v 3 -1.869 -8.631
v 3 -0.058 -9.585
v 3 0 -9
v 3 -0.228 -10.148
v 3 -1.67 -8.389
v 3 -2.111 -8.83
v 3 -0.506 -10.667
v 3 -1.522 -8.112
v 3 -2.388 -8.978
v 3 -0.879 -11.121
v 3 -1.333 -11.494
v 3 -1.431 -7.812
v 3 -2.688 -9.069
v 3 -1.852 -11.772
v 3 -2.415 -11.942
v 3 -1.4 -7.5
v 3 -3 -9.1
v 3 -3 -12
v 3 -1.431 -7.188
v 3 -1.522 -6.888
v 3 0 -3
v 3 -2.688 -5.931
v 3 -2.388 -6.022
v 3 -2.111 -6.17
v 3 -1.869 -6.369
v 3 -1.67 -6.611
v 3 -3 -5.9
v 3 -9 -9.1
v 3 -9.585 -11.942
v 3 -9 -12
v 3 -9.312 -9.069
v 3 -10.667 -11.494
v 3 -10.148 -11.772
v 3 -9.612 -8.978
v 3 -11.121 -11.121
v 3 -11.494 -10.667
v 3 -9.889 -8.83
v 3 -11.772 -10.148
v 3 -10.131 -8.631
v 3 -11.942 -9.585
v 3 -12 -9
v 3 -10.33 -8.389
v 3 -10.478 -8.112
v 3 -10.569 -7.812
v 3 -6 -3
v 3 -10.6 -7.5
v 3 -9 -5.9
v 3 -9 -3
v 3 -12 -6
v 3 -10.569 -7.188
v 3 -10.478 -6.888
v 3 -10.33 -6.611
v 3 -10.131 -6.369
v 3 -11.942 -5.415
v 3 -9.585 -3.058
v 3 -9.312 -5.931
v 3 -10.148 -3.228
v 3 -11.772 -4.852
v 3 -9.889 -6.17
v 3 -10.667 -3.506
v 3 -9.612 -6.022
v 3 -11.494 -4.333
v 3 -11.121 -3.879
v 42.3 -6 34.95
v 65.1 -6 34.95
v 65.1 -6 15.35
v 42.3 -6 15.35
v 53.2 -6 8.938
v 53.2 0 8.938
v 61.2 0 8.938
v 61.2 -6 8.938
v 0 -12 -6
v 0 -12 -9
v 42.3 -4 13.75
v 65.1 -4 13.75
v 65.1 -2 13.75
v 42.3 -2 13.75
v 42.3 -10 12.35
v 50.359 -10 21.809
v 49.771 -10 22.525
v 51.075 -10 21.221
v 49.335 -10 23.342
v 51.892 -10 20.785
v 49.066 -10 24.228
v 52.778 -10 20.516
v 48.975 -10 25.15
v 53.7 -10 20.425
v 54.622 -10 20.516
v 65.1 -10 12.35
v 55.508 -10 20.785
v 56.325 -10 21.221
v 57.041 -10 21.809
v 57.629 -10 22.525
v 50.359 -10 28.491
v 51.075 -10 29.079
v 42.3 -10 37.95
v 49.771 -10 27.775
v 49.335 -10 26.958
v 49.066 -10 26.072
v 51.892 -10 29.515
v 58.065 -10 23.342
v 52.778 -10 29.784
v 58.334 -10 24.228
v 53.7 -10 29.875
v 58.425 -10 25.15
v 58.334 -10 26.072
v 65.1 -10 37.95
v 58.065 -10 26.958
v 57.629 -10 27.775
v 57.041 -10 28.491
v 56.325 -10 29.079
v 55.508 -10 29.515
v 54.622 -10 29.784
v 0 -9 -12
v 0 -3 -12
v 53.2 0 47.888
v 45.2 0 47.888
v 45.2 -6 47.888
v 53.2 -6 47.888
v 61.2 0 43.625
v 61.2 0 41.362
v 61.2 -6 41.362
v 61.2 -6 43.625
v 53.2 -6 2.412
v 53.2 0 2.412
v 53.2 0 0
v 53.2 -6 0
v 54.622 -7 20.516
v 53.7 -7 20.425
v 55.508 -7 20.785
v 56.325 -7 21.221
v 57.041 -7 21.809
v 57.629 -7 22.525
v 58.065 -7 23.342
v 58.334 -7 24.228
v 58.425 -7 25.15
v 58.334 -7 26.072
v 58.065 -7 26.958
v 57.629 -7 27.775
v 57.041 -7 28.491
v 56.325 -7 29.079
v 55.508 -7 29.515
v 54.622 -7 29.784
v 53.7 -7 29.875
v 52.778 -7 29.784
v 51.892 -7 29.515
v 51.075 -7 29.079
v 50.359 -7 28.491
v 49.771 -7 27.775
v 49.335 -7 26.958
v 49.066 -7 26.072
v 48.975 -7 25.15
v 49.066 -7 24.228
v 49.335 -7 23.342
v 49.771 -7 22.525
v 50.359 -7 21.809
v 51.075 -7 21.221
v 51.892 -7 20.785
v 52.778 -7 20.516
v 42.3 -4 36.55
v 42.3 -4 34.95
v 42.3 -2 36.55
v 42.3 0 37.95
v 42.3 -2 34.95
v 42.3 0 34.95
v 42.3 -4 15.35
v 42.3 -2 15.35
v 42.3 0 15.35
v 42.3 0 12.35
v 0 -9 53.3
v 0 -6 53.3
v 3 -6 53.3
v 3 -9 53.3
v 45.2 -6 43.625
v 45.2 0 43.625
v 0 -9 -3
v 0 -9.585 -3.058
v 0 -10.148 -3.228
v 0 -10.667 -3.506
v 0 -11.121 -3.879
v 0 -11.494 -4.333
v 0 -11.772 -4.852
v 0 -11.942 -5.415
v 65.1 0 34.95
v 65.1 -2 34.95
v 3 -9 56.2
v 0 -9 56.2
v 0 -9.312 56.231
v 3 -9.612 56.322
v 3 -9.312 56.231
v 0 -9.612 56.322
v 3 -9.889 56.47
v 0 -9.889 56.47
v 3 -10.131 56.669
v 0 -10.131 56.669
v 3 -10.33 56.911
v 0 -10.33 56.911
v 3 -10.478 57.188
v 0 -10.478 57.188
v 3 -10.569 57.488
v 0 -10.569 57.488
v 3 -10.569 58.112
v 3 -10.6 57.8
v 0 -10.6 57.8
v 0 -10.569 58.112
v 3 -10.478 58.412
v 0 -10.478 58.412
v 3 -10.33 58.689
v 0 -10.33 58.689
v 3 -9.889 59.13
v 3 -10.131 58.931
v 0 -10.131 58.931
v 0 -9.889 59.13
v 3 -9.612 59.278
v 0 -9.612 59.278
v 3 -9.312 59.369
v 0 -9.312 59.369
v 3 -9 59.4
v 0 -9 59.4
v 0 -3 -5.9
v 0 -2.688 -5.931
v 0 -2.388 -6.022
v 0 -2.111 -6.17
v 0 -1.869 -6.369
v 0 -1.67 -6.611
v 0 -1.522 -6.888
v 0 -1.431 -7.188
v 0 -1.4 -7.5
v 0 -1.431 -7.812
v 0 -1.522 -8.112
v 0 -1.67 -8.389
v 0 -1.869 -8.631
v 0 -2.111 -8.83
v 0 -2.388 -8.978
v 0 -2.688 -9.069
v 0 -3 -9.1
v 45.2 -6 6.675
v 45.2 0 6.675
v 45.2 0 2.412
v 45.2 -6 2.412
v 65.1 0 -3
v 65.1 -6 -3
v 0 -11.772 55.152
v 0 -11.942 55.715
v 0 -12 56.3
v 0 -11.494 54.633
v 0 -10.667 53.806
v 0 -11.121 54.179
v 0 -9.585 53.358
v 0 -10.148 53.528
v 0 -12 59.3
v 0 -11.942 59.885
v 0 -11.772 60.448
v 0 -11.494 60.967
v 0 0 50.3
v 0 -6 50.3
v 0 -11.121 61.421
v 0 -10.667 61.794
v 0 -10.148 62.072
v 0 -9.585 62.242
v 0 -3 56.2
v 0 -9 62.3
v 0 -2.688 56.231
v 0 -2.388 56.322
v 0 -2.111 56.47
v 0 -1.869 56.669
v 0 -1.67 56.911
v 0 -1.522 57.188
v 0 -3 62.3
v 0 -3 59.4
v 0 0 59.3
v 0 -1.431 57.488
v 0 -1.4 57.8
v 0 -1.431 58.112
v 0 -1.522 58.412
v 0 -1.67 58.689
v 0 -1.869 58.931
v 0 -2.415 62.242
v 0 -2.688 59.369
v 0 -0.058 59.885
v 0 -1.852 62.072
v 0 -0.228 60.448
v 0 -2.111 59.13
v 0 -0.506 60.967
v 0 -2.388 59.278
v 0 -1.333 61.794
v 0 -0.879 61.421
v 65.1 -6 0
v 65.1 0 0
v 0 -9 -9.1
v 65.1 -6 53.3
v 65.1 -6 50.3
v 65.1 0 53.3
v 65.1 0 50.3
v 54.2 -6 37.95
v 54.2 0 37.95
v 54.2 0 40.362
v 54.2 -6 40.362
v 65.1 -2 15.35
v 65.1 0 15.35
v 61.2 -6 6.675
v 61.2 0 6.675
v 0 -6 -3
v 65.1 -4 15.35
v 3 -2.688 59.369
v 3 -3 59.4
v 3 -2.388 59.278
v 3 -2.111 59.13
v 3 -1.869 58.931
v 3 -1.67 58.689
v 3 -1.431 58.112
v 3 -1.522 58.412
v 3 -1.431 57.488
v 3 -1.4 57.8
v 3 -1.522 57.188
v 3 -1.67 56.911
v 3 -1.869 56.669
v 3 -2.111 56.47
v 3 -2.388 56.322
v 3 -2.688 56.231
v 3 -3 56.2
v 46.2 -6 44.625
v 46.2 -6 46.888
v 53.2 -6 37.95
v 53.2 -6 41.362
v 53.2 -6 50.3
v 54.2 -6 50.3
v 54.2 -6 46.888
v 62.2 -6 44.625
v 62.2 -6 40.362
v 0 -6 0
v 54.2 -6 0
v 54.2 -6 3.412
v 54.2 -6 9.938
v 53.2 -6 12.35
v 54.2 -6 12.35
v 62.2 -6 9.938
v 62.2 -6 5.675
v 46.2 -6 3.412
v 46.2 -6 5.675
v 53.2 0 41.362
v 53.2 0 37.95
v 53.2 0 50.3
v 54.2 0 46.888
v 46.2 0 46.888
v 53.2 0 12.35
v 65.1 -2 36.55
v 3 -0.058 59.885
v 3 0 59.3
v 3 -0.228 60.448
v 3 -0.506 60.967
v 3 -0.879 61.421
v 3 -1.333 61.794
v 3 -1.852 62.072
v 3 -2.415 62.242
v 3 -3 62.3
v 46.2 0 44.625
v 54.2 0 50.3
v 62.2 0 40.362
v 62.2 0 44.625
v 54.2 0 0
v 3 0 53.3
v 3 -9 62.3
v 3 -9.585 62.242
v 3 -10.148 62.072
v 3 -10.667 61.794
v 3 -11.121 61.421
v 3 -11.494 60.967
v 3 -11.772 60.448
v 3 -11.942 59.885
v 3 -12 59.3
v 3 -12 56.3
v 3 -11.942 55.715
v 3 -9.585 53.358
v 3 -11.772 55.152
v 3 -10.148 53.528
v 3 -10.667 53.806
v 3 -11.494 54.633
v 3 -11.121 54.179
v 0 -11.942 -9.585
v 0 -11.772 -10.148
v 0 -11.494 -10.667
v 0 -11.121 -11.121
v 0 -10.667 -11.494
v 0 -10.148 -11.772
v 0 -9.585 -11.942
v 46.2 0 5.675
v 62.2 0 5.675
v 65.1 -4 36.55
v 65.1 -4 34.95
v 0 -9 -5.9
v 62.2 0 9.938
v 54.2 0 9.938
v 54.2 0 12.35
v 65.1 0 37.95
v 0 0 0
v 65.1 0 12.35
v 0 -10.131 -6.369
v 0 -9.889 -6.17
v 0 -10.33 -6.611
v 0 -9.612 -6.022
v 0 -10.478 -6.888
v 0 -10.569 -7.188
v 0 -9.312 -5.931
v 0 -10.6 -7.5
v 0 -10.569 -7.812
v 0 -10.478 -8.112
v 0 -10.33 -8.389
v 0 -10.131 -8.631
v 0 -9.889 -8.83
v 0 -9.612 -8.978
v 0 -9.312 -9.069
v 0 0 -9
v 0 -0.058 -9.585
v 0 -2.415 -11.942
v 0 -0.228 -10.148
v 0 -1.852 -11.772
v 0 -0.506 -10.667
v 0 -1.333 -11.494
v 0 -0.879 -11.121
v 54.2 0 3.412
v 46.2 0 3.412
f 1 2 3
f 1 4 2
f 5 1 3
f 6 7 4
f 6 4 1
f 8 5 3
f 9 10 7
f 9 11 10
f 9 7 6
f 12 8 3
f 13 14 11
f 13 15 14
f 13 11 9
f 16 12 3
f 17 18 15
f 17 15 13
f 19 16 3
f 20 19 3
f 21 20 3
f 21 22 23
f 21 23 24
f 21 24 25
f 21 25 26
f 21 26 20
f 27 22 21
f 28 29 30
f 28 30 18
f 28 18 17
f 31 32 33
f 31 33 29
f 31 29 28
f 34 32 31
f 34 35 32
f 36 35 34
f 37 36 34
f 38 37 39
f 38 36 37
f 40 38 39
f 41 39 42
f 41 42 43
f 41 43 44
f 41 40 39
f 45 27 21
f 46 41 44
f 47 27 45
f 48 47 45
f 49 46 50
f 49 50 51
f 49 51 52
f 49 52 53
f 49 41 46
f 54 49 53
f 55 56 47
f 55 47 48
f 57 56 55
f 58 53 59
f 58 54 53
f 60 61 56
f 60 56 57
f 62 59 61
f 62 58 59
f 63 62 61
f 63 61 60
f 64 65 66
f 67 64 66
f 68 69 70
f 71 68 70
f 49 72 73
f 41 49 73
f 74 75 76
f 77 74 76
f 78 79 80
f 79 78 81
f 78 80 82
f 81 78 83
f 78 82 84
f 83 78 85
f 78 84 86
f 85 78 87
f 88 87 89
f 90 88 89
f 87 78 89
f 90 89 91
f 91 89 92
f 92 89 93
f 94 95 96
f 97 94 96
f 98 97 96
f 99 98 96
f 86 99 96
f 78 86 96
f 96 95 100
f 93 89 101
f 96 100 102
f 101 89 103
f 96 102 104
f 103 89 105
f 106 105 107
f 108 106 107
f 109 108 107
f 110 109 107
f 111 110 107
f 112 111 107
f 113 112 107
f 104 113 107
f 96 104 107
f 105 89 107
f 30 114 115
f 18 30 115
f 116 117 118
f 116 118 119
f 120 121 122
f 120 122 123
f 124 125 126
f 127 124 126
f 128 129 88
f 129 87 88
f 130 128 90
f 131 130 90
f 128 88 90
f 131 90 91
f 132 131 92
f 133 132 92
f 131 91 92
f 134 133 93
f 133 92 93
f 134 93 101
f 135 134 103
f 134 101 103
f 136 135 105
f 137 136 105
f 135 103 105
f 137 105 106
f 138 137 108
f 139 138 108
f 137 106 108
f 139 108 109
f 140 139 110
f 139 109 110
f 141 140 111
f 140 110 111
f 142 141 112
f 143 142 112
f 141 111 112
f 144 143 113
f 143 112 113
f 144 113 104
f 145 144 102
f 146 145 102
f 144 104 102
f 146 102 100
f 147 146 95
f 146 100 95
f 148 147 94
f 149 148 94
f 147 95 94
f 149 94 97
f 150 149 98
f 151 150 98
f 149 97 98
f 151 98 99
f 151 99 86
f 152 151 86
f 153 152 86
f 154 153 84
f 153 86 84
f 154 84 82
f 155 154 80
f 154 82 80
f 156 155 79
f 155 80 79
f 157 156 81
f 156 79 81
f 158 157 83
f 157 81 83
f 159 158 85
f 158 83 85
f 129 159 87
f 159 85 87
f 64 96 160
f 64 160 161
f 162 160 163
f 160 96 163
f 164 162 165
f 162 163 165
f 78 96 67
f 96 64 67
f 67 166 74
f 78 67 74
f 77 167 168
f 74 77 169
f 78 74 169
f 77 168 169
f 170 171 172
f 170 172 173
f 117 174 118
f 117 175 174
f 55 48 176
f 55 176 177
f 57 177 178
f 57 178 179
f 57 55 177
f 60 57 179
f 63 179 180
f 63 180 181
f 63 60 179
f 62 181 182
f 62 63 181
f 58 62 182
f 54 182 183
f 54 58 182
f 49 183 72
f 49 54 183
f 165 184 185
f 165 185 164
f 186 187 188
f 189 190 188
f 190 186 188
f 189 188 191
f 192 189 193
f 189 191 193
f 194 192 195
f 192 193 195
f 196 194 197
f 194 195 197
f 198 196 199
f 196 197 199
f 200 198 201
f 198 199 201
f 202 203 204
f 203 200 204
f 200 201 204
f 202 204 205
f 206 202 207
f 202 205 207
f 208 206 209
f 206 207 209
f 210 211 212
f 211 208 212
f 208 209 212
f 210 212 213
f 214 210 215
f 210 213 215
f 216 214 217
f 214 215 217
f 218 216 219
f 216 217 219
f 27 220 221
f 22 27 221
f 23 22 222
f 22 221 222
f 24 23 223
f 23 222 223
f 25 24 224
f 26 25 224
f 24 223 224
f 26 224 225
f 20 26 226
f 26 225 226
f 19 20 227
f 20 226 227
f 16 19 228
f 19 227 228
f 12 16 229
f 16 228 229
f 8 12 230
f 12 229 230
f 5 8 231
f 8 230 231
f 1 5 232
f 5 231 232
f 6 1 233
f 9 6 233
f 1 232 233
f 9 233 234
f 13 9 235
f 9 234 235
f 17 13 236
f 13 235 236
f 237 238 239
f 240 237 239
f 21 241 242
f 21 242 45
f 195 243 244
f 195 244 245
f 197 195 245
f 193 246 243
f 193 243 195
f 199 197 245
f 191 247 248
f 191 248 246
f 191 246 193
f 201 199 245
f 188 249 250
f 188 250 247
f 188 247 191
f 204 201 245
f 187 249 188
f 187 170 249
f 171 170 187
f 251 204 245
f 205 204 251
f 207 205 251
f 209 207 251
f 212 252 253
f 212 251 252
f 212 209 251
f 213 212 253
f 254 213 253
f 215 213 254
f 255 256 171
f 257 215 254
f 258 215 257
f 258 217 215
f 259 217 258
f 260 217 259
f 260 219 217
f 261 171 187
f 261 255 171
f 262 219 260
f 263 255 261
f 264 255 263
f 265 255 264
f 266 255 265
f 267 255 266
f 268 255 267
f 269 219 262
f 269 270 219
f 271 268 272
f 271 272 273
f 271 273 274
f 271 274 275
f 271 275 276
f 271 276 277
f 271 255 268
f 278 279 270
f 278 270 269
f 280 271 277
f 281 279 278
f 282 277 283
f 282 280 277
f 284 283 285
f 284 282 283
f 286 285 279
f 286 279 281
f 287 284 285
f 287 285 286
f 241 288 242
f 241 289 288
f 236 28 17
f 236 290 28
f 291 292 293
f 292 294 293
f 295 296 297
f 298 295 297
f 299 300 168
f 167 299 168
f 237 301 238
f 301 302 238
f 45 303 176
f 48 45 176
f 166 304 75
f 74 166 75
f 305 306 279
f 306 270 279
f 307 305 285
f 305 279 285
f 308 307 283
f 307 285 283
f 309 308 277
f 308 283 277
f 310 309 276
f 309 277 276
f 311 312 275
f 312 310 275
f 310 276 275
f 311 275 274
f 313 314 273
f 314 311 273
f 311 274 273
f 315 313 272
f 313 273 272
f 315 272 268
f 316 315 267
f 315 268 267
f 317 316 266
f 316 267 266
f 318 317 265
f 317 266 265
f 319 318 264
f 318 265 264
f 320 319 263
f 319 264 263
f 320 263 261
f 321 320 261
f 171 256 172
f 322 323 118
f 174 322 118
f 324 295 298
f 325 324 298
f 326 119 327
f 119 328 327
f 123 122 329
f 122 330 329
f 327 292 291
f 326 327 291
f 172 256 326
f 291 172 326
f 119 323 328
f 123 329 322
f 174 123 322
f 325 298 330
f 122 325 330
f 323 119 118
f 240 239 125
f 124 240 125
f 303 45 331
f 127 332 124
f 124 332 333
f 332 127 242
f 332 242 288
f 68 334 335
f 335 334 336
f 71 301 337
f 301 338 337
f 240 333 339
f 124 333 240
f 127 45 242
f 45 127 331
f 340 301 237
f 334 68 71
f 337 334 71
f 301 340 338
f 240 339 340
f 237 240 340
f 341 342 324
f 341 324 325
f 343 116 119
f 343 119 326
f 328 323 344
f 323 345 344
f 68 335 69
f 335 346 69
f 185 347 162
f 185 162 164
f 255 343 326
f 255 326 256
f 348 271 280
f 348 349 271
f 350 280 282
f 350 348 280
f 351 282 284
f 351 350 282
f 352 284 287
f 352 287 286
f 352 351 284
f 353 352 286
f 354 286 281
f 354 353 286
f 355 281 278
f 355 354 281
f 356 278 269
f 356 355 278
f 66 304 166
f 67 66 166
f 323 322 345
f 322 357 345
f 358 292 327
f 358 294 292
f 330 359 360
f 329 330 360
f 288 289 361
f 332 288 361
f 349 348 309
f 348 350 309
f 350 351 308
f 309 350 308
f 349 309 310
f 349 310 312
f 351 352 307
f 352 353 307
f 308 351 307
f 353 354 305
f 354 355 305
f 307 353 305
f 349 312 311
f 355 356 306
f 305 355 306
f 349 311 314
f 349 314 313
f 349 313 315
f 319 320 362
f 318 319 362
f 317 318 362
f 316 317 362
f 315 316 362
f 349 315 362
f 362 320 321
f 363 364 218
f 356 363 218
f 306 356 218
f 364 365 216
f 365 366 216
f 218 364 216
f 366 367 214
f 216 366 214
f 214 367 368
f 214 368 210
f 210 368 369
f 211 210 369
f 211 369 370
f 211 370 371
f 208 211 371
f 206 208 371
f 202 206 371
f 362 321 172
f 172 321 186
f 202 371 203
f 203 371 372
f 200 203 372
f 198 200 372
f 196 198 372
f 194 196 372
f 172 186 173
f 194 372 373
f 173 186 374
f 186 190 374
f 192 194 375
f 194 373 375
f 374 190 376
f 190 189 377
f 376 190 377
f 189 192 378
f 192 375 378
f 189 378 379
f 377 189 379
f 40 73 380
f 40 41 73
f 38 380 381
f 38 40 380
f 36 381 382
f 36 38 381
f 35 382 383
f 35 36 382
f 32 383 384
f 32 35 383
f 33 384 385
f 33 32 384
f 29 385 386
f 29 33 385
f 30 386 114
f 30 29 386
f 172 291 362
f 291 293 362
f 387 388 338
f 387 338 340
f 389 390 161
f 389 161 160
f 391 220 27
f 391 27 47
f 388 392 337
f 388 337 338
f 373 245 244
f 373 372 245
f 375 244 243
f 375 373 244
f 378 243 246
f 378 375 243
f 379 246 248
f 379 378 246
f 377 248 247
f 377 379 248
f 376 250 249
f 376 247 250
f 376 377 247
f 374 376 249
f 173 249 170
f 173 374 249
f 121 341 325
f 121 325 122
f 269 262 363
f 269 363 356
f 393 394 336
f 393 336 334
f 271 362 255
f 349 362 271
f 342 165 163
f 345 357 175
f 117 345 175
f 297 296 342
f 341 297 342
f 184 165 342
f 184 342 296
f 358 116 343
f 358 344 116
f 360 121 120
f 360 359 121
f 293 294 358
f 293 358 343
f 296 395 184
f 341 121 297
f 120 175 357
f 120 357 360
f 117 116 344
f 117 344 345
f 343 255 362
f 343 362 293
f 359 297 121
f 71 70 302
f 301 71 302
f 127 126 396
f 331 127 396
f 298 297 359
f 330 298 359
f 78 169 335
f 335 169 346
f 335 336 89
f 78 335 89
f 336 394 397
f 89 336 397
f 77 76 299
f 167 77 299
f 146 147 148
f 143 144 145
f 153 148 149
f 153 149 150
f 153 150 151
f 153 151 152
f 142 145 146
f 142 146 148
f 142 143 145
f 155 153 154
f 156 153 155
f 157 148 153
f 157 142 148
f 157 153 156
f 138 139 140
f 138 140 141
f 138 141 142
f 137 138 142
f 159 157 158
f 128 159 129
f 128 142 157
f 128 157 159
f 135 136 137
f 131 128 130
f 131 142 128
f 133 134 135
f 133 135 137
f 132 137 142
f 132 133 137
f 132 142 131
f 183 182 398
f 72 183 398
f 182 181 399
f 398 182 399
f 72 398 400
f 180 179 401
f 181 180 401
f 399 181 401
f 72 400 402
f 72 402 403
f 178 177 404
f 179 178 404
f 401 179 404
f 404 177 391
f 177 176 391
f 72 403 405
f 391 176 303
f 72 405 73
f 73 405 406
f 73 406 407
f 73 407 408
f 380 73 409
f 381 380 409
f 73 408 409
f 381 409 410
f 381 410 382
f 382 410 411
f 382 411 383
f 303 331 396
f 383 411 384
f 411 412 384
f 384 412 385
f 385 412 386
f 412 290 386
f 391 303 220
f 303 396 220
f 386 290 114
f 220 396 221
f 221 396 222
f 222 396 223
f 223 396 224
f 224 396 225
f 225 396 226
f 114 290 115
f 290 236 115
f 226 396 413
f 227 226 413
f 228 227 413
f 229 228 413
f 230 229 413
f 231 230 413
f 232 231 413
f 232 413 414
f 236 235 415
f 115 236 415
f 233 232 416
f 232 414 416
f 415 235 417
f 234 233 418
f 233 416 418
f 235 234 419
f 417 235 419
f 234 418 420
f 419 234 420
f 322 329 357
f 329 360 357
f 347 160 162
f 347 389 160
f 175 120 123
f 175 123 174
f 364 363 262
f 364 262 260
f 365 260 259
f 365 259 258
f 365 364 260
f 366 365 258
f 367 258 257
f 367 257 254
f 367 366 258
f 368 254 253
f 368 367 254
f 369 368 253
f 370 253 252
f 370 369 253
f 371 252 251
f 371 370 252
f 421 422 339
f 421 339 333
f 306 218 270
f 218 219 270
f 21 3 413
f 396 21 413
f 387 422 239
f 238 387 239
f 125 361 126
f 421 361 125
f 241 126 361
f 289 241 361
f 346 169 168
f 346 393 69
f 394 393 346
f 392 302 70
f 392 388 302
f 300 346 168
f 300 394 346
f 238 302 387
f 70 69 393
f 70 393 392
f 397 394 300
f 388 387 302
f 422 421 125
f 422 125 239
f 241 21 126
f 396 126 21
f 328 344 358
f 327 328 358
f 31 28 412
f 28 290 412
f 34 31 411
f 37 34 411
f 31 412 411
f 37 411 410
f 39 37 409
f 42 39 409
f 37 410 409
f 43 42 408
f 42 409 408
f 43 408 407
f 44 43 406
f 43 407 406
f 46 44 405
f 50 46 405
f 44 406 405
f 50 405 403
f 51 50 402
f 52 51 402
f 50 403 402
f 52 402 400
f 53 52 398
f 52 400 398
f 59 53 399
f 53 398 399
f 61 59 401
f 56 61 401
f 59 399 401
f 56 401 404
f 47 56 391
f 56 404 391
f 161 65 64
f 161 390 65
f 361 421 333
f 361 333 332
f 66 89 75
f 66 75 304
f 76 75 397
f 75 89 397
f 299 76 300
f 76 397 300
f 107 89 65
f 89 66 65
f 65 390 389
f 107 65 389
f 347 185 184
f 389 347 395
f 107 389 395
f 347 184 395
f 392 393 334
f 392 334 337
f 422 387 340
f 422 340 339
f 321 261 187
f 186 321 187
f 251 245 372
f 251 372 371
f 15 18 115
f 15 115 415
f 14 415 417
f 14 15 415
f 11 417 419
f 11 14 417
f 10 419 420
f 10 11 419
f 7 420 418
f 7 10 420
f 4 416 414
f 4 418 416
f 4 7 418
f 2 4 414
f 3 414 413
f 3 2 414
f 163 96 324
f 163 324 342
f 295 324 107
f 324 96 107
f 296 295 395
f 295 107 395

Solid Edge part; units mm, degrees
sketch "Sketch1" plane through (0, 0, 0) normal (0, -1, 0) x (1, 0, 0)
  line L0 (65.1, -3) -> (0, -3)
  line L1 (0, 0) -> (0, -3)
  line L2 (65.1, 0) -> (0, 0)
  line L3 (65.1, 0) -> (65.1, -3)
  line L4 (61.2, 8.9375) -> (61.2, 6.675)
  line L5 (61.2, 6.675) -> (45.2, 6.675)
  line L6 (45.2, 6.675) -> (45.2, 2.4125)
  line L7 (45.2, 2.4125) -> (53.2, 2.4125)
  line L8 (53.2, 2.4125) -> (53.2, 0)
  line L9 (54.2, 0) -> (53.2, 0)
  line L10 (54.2, 3.4125) -> (54.2, 0)
  line L11 (46.2, 3.4125) -> (54.2, 3.4125)
  line L12 (46.2, 5.675) -> (46.2, 3.4125)
  line L13 (62.2, 5.675) -> (46.2, 5.675)
  line L14 (62.2, 9.9375) -> (62.2, 5.675)
  line L15 (54.2, 9.9375) -> (62.2, 9.9375)
  line L16 (54.2, 12.35) -> (54.2, 9.9375)
  line L17 (54.2, 12.35) -> (53.2, 12.35)
  line L18 (53.2, 12.35) -> (53.2, 8.9375)
  line L19 (53.2, 8.9375) -> (61.2, 8.9375)
  line L20 (65.1, 15.35) -> (42.3, 15.35)
  line L21 (42.3, 15.35) -> (42.3, 12.35)
  line L22 (42.3, 12.35) -> (65.1, 12.35)
  line L23 (65.1, 12.35) -> (65.1, 15.35)
  line L24 (65.1, 34.95) -> (42.3, 34.95)
  line L25 (42.3, 34.95) -> (42.3, 37.95)
  line L26 (42.3, 37.95) -> (65.1, 37.95)
  line L27 (65.1, 37.95) -> (65.1, 34.95)
  line L28 (54.2, 37.95) -> (54.2, 40.3625)
  line L29 (54.2, 40.3625) -> (62.2, 40.3625)
  line L30 (62.2, 40.3625) -> (62.2, 44.625)
  line L31 (62.2, 44.625) -> (46.2, 44.625)
  line L32 (46.2, 44.625) -> (46.2, 46.8875)
  line L33 (46.2, 46.8875) -> (54.2, 46.8875)
  line L34 (54.2, 46.8875) -> (54.2, 50.3)
  line L35 (54.2, 50.3) -> (53.2, 50.3)
  line L36 (53.2, 47.8875) -> (53.2, 50.3)
  line L37 (45.2, 47.8875) -> (53.2, 47.8875)
  line L38 (45.2, 43.625) -> (45.2, 47.8875)
  line L39 (61.2, 43.625) -> (45.2, 43.625)
  line L40 (61.2, 41.3625) -> (61.2, 43.625)
  line L41 (53.2, 41.3625) -> (61.2, 41.3625)
  line L42 (53.2, 37.95) -> (53.2, 41.3625)
  line L43 (54.2, 37.95) -> (53.2, 37.95)
  line L44 (65.1, 50.3) -> (0, 50.3)
  line L45 (0, 50.3) -> (0, 53.3)
  line L46 (65.1, 53.3) -> (0, 53.3)
  line L47 (65.1, 50.3) -> (65.1, 53.3)
  dimension "D1" = 3
  dimension "D2" = 65.1
  dimension "D3" = 25.15
  dimension "D4" = 22.8
  dimension "D5" = 3
  dimension "D6" = 12.35
  dimension "D7" = 2.9125
  dimension "D8" = 8
  dimension "D9" = 0.5
  dimension "D10" = 0.5
extrude "Protrusion1" add sketch "Sketch1" along normal blind 6
sketch "Sketch2" plane through (65.1, -3, 13.15) normal (1, 0, 0) x (0, 0, -1)
  line L0 (-2.2, -1) -> (-2.2, 1)
  line L1 (-0.6, 1) -> (-2.2, 1)
  line L2 (-0.6, -1) -> (-0.6, 1)
  line L3 (-2.2, -1) -> (-0.6, -1)
  line L4 (-21.8, -1) -> (-23.4, -1)
  line L5 (-23.4, -1) -> (-23.4, 1)
  line L6 (-23.4, 1) -> (-21.8, 1)
  line L7 (-21.8, -1) -> (-21.8, 1)
extrude "Cutout1" cut sketch "Sketch2" against normal up to next
sketch "Sketch3" plane through (0, -3, 51.8) normal (-1, 0, 0) x (0, 0, -1)
  line L0 (-7.6, 6) -> (-7.6, 0)
  arc A0 (-4.4, 0) -> (-7.6, 0) centre (-6, 0) cw
  line L1 (-4.4, 0) -> (-4.4, 6)
  arc A1 (-7.6, 6) -> (-4.4, 6) centre (-6, 6) cw
  line L2 (-1.5, -3) -> (-1.5, 9)
  line L3 (-1.5, 9) -> (-10.5, 9)
  line L4 (-10.5, 9) -> (-10.5, -3)
  line L5 (-10.5, -3) -> (-1.5, -3)
  line L6 (54.8, -3) -> (54.8, 9)
  line L7 (54.8, 9) -> (63.8, 9)
  line L8 (63.8, 9) -> (63.8, -3)
  line L9 (63.8, -3) -> (54.8, -3)
  arc A2 (60.9, 6) -> (57.7, 6) centre (59.3, 6) ccw
  line L10 (57.7, 0) -> (57.7, 6)
  arc A3 (57.7, 0) -> (60.9, 0) centre (59.3, 0) ccw
  line L11 (60.9, 6) -> (60.9, 0)
  dimension "D1" = 9
  dimension "D2" = 3.2
  dimension "D3" = 3
  dimension "D4" = 3
  dimension "D5" = 12
extrude "ProtrusiónExtruida_4" add sketch "Sketch3" against normal blind 3
fillet "Redondeo_2" radius 3 6 edges at (1.5, -12, -3) (1.5, -12, -12) (1.5, 0, -12) (1.5, -12, 53.3) (1.5, -12, 62.3) (1.5, 0, 62.3)
sketch "Sketch4" plane through (65.1, -3, 13.85) normal (1, 0, 0) x (0, -1, 0)
  line L0 (7, 1.5) -> (7, -24.1)
  line L1 (7, -24.1) -> (3, -24.1)
  line L2 (3, -24.1) -> (3, 1.5)
  line L3 (3, 1.5) -> (7, 1.5)
extrude "ProtrusiónExtruida_5" add sketch "Sketch4" against normal blind 22.8
sketch "Sketch5" plane through (53.7, -10, 25.15) normal (0, -1, 0) x (0, 0, -1)
  circle A0 centre (0, 0) radius 4.725
extrude "VaciadoExtruido_7" cut sketch "Sketch5" against normal blind 3
fillet "Redondeo_3" [suppressed]
